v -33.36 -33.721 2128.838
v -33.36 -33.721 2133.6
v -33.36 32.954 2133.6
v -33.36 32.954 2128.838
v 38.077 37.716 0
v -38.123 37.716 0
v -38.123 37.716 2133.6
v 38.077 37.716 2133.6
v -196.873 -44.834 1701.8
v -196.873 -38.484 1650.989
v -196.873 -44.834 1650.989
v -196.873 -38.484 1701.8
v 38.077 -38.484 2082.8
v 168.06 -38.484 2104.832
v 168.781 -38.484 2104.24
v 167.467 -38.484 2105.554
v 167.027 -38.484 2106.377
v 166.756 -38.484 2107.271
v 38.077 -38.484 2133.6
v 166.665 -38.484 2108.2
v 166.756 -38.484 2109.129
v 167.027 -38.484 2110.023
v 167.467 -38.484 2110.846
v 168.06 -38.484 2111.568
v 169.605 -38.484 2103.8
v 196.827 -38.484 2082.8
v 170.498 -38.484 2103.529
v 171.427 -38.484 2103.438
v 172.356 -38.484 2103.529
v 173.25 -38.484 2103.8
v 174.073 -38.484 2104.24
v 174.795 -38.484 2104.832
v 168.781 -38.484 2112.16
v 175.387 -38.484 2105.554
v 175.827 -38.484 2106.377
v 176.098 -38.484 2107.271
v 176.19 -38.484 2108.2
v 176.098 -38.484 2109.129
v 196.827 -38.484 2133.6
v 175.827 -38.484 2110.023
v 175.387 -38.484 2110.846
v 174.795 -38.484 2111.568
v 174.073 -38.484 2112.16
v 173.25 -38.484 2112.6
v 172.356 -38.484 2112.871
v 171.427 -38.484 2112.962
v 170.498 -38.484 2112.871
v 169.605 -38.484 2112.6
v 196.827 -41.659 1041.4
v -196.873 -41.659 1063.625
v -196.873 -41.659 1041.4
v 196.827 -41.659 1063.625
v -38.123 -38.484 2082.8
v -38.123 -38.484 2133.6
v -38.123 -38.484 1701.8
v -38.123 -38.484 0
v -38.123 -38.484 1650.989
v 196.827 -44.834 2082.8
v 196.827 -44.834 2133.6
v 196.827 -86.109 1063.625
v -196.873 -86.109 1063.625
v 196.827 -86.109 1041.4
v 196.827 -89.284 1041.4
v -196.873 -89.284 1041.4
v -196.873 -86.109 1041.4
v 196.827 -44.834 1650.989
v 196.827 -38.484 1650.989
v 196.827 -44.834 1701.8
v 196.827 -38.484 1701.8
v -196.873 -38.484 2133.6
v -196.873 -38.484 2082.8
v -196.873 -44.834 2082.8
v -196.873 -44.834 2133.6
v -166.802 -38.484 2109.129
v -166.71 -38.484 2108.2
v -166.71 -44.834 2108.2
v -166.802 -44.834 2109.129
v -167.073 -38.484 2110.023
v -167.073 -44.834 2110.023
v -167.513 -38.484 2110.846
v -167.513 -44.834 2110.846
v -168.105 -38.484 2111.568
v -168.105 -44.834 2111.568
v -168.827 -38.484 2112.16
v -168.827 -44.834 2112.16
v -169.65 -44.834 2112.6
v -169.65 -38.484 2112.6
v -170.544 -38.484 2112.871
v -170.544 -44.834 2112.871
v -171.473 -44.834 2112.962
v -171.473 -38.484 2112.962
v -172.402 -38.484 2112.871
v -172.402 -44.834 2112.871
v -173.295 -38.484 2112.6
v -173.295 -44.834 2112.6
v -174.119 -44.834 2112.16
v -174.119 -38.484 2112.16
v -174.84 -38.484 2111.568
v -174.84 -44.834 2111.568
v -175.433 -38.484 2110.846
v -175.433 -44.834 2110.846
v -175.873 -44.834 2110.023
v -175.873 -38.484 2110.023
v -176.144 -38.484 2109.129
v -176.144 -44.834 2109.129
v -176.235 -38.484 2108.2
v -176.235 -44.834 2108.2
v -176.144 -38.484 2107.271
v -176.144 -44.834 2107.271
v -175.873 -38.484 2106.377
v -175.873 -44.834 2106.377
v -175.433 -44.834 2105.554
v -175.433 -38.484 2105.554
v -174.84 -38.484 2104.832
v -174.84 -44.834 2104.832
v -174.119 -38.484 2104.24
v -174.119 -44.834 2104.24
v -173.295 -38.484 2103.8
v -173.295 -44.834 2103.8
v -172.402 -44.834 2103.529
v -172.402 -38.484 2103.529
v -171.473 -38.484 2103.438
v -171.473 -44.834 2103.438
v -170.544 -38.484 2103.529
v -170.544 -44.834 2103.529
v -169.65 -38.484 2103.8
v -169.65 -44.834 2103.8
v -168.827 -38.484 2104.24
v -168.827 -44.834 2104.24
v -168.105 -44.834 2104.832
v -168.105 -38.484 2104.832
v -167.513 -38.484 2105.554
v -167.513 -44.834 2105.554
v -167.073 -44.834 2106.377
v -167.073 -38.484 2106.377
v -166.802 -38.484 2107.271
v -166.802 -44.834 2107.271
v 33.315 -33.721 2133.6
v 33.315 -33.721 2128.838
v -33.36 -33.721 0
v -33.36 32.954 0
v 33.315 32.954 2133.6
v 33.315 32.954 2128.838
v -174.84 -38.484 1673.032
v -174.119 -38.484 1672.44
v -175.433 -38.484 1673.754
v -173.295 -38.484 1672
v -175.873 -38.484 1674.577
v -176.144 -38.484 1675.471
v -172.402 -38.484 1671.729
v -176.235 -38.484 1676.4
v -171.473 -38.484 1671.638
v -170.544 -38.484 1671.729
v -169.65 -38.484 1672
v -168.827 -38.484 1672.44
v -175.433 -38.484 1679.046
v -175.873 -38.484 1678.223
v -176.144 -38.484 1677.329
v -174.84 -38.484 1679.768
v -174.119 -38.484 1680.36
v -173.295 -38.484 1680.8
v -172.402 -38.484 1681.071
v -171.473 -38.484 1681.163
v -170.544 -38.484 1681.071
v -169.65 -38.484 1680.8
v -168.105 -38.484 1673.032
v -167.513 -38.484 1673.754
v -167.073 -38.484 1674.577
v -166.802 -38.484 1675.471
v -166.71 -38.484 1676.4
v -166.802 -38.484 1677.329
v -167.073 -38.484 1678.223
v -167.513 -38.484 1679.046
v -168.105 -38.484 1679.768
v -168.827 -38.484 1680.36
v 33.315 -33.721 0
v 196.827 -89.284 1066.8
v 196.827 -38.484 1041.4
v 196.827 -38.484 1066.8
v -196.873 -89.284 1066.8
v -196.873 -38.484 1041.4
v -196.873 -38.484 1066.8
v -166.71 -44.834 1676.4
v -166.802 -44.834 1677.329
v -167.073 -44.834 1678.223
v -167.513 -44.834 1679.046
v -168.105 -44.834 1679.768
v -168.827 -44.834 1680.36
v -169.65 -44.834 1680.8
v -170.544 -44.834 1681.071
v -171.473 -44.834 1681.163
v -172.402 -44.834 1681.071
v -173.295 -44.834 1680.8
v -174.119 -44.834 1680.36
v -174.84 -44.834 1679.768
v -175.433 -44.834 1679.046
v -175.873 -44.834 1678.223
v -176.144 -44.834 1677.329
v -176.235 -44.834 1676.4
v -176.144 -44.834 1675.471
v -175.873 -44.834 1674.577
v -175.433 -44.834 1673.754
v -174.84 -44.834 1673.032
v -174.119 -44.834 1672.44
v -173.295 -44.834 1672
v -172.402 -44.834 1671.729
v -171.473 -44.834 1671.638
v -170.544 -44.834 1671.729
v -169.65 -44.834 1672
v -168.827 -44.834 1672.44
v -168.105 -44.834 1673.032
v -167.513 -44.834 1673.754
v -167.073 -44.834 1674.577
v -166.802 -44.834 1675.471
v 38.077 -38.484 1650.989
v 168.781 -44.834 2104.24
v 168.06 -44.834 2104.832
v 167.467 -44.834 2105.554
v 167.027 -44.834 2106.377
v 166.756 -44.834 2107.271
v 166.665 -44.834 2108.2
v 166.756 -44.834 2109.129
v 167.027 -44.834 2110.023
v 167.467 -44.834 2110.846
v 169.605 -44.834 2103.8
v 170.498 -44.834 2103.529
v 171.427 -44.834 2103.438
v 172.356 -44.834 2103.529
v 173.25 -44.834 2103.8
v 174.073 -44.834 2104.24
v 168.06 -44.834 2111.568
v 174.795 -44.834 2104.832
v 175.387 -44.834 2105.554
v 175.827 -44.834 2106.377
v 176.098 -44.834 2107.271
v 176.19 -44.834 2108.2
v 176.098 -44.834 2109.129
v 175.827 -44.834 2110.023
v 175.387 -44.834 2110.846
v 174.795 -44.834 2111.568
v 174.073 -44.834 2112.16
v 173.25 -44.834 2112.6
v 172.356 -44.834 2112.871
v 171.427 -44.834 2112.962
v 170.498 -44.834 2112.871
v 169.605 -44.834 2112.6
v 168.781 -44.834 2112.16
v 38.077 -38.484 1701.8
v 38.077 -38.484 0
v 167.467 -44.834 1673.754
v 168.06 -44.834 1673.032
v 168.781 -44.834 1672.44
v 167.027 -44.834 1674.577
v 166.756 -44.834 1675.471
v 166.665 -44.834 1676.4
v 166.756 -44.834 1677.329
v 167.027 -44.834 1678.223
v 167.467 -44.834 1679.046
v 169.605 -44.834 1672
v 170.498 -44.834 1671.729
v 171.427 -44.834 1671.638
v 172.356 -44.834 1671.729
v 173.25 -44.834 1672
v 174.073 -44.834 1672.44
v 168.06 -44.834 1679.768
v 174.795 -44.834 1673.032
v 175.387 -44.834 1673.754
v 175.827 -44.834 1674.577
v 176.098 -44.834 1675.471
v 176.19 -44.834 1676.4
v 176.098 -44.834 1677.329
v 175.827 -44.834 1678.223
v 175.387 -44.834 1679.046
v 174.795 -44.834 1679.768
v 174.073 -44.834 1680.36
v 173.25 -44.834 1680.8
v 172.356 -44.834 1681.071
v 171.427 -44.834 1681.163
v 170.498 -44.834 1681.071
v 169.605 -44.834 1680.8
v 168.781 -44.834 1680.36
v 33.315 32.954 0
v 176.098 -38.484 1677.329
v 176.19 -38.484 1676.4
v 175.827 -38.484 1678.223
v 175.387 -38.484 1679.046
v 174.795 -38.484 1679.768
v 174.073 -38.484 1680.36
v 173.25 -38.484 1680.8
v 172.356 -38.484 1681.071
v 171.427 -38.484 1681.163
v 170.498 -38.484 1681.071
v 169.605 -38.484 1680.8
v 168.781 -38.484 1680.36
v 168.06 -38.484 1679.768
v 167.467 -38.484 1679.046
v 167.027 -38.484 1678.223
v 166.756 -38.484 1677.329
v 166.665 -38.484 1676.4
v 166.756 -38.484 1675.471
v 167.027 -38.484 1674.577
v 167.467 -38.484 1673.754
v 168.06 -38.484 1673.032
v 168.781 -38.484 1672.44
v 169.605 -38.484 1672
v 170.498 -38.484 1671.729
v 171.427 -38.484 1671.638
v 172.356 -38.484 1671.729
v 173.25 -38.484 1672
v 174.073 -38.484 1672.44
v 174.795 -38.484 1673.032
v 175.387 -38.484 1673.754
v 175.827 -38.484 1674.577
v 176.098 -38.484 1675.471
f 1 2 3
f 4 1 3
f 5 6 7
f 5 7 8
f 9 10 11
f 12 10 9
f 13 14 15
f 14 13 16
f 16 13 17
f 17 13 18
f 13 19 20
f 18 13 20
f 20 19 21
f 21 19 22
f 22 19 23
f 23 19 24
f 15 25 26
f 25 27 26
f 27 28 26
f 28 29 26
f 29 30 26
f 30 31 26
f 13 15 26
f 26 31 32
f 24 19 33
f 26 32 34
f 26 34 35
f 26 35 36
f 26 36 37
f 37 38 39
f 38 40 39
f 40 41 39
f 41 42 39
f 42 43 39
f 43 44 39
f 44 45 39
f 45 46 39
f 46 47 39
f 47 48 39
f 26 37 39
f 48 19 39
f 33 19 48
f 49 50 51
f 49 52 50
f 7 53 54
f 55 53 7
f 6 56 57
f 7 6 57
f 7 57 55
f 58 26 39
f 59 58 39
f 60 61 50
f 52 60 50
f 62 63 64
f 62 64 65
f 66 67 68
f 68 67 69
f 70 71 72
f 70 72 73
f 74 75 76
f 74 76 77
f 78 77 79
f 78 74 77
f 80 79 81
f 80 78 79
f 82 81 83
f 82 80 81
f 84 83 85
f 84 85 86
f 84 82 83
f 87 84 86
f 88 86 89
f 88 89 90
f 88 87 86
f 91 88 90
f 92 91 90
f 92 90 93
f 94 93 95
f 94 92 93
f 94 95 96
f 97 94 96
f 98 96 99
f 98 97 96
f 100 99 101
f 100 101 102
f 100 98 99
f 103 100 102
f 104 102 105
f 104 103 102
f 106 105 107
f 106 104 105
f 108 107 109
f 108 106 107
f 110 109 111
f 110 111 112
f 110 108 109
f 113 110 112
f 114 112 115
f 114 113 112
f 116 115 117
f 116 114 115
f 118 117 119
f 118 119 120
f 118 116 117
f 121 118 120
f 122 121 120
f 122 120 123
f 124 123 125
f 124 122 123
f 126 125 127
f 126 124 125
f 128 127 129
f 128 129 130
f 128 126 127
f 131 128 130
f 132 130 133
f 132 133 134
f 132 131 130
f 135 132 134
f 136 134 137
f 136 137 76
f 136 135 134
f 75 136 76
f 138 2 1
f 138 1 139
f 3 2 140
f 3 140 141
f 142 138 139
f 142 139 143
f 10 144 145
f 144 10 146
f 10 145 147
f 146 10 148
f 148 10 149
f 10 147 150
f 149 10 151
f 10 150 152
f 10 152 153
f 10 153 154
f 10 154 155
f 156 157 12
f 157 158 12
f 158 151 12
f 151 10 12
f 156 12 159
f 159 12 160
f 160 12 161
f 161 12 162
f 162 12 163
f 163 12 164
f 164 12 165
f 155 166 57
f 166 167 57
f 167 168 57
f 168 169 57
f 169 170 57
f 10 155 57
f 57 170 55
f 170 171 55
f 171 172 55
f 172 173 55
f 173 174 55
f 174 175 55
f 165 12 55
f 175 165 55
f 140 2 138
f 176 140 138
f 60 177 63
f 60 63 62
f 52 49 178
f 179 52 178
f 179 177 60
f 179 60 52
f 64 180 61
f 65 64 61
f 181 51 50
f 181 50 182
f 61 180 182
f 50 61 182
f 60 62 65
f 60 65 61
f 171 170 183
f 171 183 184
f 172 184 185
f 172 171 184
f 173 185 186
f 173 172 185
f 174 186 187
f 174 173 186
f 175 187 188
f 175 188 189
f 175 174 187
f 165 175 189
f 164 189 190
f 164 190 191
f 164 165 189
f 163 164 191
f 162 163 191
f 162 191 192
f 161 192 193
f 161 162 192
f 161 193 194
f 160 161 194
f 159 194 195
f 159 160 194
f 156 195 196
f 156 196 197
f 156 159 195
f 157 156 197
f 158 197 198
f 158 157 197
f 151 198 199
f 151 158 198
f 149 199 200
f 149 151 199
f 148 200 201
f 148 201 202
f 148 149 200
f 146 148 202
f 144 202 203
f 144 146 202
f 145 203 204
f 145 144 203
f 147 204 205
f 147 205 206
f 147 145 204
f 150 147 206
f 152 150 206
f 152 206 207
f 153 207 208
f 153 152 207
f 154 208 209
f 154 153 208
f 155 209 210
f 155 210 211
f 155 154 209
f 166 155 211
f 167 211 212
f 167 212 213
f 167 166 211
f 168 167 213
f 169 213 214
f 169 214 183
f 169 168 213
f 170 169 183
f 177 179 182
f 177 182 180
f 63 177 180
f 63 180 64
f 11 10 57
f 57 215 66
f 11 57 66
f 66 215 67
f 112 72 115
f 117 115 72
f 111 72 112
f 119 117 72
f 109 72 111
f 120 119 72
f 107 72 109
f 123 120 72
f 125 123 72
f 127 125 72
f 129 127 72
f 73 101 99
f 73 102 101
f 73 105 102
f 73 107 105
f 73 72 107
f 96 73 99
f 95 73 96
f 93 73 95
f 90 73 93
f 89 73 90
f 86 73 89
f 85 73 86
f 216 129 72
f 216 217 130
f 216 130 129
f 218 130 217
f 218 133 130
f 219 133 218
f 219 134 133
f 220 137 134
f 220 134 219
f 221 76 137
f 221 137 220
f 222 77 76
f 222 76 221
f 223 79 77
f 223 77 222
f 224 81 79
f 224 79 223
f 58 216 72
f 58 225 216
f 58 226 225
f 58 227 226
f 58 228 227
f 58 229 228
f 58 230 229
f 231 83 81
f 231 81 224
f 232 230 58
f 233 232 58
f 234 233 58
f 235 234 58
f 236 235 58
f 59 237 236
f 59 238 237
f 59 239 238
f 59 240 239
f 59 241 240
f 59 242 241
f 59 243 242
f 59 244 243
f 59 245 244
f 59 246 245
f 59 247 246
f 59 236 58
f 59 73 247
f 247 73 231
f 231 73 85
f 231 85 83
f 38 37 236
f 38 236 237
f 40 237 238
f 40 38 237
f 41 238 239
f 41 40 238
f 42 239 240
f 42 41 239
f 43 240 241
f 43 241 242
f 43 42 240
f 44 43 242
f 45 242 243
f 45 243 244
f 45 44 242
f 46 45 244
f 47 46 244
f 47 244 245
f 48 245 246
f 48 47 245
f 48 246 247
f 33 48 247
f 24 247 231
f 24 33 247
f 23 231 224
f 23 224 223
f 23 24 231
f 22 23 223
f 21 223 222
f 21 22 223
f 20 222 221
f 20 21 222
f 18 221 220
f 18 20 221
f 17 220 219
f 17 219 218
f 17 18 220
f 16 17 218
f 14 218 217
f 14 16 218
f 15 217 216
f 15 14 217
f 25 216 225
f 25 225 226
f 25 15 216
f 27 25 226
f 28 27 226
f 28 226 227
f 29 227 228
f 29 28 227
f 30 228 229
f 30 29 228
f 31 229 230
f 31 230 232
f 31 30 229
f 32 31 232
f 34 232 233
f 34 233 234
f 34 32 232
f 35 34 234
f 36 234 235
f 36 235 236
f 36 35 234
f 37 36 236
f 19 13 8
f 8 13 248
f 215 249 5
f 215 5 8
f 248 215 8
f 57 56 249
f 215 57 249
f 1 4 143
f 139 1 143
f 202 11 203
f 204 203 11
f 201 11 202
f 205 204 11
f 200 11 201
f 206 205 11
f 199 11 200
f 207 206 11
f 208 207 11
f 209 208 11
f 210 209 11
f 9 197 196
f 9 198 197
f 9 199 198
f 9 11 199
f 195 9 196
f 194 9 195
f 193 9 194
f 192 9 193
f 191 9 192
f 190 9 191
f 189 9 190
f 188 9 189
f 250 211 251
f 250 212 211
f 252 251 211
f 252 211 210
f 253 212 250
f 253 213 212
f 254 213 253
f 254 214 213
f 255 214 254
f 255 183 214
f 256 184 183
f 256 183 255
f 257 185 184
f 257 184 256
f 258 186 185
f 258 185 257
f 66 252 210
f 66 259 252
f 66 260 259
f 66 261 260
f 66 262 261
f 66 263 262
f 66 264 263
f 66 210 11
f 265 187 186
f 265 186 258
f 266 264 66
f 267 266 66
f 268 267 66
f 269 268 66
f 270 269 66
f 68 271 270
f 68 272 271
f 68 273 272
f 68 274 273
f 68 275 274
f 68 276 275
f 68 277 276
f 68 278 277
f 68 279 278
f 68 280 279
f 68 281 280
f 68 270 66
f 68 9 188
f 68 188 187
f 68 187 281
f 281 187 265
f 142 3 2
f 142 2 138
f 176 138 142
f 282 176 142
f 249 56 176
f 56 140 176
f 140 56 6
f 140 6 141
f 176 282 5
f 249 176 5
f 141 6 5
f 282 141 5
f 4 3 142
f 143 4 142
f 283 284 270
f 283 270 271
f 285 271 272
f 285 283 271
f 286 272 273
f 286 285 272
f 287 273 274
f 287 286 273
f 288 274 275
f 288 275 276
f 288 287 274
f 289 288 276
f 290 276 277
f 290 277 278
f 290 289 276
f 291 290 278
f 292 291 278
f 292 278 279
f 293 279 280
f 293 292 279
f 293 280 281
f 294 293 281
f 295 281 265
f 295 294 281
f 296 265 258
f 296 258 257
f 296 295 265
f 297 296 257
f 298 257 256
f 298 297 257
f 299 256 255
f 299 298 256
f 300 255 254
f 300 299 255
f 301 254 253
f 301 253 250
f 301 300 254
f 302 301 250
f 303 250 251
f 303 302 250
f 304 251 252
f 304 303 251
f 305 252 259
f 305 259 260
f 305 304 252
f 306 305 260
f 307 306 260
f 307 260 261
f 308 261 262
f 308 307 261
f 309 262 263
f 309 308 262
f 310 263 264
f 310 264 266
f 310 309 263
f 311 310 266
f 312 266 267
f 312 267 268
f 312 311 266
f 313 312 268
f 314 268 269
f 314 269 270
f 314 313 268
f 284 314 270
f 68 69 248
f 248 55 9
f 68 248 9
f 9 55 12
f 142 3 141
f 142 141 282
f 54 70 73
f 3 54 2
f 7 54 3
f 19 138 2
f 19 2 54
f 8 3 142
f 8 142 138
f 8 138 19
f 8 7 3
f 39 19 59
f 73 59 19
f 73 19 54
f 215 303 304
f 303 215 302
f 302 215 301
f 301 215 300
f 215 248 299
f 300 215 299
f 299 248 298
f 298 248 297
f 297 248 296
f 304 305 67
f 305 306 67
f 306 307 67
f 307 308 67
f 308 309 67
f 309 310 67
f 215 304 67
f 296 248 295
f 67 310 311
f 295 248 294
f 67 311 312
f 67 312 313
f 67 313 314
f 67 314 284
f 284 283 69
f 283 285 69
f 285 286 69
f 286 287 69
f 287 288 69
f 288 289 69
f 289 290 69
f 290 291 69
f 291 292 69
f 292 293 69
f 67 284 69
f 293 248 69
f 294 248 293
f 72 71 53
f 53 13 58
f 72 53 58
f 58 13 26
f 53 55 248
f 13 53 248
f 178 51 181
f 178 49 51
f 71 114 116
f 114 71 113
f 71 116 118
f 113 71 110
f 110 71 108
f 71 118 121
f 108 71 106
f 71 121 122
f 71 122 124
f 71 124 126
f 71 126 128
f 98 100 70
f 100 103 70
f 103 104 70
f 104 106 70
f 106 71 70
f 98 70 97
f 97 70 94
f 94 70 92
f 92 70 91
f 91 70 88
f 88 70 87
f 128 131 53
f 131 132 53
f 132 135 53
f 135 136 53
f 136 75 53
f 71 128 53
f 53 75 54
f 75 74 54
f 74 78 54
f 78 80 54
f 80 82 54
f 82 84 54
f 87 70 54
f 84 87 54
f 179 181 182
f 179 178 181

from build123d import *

# Parameters (mm, degrees)
F0_W          = 76.2
F0_H          = 76.2
F0_W_2        = 66.675
F0_H_2        = 66.675
F1_DEPTH      = 2133.6
F2_W          = 66.675
F2_H          = 66.675
F4_DEPTH      = 4.7625
F5_W          = 158.75
F5_H          = 50.8105754852
F5_R          = 4.7625
F5_W_2        = 76.2
F5_H_2        = 50.8
F6_DEPTH      = 6.35
F8_DEPTH      = 158.75
F8_DEPTH_BACK = 234.95


# Not quite as in the source:
# - a feature names something its author has since deleted; it is built from what else it names


with BuildPart() as f1:
    # F0 (on Top) → F1 (new body)
    with BuildSketch(Plane.XY):
        with Locations((-0.0228539575, -0.3835560492)):
            Rectangle(F0_W, F0_H)
        with Locations((-0.0228539575, -0.3835560492)):
            Rectangle(F0_W_2, F0_H_2, mode=Mode.SUBTRACT)
    extrude(amount=F1_DEPTH)

    # F5 (on face) → F6 (join)
    with BuildSketch(Plane.XZ.offset(38.4835560492)):
        with Locations((-117.4978539575, 1676.3947122574)):
            Rectangle(F5_W, F5_H)
        with Locations((-171.4728539575, 1676.4)):
            Circle(F5_R, mode=Mode.SUBTRACT)
        with Locations((117.4521460425, 1676.3947122574)):
            Rectangle(F5_W, F5_H)
        with Locations((171.4271460425, 1676.4)):
            Circle(F5_R, mode=Mode.SUBTRACT)
        with Locations((-0.0228539575, 1676.3947122574)):
            Rectangle(F5_W_2, F5_H)
        with Locations((-117.4978539575, 2108.2)):
            Rectangle(F5_W, F5_H_2)
        with Locations((-171.4728539575, 2108.2)):
            Circle(F5_R, mode=Mode.SUBTRACT)
        with Locations((-0.0228539575, 2108.2)):
            Rectangle(F5_W_2, F5_H_2)
        with Locations((117.4521460425, 2108.2)):
            Rectangle(F5_W, F5_H_2)
        with Locations((171.4271460425, 2108.2)):
            Circle(F5_R, mode=Mode.SUBTRACT)
    extrude(amount=F6_DEPTH)


with BuildPart() as f4:
    # F2 (on face) → F4 (new body)
    with BuildSketch(Plane.XY.offset(2133.6)):
        with Locations((-0.0228539575, -0.3835560492)):
            Rectangle(F2_W, F2_H)
    extrude(amount=-F4_DEPTH)


with BuildPart() as f8:
    # F7 (on face) → F8 (new body, two sides)
    with BuildSketch(Plane.YZ.offset(38.0771460425)) as f8_sk:
        Polygon((-38.4835560492, 1041.4), (-38.4835560492, 1066.8), (-89.2835560492, 1066.8), (-89.2835560492, 1041.4), (-86.1085560492, 1041.4), (-86.1085560492, 1063.625), (-41.6585560492, 1063.625), (-41.6585560492, 1041.4), align=None)
    extrude(amount=F8_DEPTH)
    extrude(f8_sk.sketch, amount=-F8_DEPTH_BACK)


solid = Compound([f1.part, f4.part, f8.part])
